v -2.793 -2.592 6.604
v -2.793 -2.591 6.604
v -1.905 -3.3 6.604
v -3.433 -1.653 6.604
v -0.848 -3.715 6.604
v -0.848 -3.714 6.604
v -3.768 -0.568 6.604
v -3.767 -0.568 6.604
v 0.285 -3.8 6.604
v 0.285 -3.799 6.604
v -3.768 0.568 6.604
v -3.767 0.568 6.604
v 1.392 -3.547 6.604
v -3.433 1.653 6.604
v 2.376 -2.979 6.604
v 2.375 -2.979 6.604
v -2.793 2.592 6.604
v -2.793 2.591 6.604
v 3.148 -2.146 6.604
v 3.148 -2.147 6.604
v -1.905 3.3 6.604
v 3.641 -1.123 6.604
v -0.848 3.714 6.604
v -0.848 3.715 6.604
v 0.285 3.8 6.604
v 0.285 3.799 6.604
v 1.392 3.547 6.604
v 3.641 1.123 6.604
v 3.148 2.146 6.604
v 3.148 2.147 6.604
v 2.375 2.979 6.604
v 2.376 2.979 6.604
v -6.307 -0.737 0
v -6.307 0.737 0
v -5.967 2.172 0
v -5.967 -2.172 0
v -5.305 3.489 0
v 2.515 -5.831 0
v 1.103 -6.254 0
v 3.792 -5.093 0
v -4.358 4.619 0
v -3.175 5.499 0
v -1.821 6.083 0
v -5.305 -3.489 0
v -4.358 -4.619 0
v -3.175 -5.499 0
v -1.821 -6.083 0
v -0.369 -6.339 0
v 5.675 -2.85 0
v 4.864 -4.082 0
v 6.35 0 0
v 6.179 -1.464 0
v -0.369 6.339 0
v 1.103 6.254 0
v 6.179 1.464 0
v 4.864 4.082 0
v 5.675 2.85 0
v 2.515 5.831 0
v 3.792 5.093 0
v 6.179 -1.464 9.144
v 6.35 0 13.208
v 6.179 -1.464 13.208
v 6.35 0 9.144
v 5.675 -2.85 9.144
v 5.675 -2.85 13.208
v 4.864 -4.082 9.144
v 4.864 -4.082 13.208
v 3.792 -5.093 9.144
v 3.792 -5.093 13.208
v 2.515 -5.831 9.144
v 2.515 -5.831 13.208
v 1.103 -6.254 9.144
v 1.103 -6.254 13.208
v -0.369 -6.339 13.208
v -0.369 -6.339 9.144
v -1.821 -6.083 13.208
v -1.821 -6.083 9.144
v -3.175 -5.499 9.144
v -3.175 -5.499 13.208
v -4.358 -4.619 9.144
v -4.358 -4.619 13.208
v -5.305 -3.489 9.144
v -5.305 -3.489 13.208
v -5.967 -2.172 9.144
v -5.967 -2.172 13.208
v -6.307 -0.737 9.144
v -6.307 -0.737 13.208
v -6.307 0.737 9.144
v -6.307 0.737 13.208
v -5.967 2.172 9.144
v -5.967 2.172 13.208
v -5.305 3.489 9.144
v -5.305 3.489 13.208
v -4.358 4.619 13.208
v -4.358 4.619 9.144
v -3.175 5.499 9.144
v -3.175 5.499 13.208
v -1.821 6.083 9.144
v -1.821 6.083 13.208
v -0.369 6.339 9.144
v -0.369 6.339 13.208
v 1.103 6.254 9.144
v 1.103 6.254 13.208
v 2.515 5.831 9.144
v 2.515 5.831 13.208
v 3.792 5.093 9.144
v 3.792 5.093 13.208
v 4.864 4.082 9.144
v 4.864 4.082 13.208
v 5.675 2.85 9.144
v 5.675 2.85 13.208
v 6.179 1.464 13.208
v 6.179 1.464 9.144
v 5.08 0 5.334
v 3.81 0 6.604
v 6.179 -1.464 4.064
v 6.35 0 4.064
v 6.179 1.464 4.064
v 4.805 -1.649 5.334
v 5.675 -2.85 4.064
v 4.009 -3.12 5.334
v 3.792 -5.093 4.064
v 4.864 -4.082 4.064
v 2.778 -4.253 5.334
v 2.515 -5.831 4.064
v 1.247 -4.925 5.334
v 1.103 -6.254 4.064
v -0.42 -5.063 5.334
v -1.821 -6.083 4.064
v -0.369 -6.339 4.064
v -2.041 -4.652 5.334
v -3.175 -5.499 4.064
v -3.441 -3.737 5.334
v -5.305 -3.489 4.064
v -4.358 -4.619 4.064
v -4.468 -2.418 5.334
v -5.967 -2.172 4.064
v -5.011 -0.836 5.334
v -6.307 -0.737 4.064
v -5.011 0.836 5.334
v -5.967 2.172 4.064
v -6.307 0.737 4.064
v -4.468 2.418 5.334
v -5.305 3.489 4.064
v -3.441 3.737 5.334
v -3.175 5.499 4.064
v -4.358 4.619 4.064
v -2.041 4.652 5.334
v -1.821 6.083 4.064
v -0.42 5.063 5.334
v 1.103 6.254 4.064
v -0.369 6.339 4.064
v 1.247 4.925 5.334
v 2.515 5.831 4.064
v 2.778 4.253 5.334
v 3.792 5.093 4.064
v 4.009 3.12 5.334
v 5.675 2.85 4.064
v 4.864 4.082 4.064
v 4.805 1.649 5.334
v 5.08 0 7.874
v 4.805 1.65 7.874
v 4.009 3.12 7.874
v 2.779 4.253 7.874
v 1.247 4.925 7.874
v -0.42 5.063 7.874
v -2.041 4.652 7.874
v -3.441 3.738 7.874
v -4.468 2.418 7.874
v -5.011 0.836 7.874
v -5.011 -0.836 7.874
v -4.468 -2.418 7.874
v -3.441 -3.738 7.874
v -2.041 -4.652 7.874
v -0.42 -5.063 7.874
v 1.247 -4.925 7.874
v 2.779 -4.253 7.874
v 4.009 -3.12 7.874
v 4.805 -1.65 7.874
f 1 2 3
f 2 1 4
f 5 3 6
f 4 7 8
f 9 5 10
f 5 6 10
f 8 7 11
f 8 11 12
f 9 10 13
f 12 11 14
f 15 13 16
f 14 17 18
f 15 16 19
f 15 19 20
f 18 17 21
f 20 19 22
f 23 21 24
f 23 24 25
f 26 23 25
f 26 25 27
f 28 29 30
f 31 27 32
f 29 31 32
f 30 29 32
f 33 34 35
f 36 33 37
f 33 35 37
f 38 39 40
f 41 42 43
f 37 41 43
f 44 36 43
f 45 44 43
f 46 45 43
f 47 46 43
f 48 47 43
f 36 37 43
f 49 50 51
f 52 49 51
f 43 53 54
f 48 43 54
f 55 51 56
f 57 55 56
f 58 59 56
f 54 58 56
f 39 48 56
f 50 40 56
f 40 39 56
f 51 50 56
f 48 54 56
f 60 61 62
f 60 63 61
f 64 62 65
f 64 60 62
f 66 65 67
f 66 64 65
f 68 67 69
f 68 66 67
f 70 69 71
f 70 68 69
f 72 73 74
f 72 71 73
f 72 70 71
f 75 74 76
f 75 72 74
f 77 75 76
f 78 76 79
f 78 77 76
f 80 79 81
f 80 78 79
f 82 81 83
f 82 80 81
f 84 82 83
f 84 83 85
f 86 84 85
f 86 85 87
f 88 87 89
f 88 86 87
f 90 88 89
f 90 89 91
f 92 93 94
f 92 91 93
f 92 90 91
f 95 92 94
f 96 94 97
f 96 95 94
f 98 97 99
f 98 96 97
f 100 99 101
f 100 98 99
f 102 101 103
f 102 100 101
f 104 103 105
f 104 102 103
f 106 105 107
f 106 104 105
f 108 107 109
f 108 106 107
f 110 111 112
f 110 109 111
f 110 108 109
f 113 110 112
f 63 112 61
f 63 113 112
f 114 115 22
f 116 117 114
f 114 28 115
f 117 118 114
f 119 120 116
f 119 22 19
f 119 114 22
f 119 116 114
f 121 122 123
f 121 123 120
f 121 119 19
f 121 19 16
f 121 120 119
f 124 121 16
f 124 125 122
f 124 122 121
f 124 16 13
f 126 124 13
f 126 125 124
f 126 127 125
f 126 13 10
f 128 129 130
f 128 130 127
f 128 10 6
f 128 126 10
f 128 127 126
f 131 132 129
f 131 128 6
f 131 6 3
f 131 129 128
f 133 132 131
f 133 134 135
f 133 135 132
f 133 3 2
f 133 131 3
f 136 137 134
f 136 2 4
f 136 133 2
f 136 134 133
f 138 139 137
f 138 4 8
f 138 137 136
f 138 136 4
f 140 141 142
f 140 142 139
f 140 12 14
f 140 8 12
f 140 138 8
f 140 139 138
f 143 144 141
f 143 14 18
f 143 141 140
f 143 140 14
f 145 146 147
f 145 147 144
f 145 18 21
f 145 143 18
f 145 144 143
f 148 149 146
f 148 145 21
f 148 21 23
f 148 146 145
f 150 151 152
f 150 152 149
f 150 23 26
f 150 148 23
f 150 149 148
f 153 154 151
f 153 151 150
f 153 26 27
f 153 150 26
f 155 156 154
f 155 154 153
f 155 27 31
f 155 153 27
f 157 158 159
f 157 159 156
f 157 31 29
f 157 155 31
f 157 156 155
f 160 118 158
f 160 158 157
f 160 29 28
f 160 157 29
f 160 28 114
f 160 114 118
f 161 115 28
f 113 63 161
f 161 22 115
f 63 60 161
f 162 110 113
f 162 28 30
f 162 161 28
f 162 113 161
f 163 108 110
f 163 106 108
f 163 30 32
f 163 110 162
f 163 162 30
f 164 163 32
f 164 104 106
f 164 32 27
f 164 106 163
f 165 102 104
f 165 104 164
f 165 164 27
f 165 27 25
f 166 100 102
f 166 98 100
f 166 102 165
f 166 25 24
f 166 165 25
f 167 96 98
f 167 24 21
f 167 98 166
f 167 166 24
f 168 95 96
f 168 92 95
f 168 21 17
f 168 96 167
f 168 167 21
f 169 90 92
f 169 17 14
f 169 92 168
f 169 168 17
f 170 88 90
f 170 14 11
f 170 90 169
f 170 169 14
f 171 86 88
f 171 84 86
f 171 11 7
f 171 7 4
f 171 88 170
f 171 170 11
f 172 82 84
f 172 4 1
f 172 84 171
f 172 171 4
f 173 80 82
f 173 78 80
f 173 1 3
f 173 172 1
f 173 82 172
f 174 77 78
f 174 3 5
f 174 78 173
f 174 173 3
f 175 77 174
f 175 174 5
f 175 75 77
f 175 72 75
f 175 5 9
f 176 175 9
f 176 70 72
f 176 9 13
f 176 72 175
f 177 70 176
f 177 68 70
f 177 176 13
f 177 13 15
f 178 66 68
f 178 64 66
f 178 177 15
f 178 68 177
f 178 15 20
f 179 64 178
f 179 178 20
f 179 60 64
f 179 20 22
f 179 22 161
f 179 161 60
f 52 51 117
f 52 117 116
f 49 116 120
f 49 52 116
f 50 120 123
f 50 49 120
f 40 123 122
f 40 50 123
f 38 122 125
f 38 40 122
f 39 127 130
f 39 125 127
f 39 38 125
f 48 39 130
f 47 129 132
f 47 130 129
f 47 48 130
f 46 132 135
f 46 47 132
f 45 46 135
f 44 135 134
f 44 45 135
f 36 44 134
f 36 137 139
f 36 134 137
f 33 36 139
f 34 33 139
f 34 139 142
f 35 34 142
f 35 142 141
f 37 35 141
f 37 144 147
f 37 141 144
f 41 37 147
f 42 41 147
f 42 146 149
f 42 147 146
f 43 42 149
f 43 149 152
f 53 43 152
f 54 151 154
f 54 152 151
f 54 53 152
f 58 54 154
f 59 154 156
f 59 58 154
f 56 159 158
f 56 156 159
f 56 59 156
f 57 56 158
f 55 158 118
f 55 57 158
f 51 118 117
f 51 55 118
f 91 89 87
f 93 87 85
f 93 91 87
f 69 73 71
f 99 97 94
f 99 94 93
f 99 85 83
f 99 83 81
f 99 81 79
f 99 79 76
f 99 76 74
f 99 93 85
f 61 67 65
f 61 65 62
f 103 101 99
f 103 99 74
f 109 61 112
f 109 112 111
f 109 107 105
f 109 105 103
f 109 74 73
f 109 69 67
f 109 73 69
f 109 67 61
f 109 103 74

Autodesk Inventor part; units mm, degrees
ref_plane "YZ Plane" through (0, 0, 0) normal (1, 0, 0) x (0, 1, 0)
ref_plane "XZ Plane" through (0, 0, 0) normal (0, 1, 0) x (-1, 0, 0)
ref_plane "XY Plane" through (0, 0, 0) normal (0, 0, 1) x (1, 0, 0)
sketch "Sketch1" plane through (0, 0, 0) normal (0, 0, 1) x (1, 0, 0)
  circle A0 centre (0, 0) radius 6.35
  dimension "d0" = 12.7
extrude "Extrusion1" add sketch "Sketch1" along normal blind 6.604
chamfer "Chamfer1" distance 2.54 angle 45 1 edges at (-6.35, 0, 6.604)
sketch "Sketch2" plane through (0, 0, 6.604) normal (0, 0, 1) x (1, 0, 0)
  circle A0 centre (0, 0) radius 6.35
  dimension "d6" = 12.7
extrude "Extrusion2" add sketch "Sketch2" along normal blind 6.604
chamfer "Chamfer2" distance 2.54 angle 45 1 edges at (-6.35, 0, 6.604)
properties part number "LiftPully" material "Aluminum 6061"
